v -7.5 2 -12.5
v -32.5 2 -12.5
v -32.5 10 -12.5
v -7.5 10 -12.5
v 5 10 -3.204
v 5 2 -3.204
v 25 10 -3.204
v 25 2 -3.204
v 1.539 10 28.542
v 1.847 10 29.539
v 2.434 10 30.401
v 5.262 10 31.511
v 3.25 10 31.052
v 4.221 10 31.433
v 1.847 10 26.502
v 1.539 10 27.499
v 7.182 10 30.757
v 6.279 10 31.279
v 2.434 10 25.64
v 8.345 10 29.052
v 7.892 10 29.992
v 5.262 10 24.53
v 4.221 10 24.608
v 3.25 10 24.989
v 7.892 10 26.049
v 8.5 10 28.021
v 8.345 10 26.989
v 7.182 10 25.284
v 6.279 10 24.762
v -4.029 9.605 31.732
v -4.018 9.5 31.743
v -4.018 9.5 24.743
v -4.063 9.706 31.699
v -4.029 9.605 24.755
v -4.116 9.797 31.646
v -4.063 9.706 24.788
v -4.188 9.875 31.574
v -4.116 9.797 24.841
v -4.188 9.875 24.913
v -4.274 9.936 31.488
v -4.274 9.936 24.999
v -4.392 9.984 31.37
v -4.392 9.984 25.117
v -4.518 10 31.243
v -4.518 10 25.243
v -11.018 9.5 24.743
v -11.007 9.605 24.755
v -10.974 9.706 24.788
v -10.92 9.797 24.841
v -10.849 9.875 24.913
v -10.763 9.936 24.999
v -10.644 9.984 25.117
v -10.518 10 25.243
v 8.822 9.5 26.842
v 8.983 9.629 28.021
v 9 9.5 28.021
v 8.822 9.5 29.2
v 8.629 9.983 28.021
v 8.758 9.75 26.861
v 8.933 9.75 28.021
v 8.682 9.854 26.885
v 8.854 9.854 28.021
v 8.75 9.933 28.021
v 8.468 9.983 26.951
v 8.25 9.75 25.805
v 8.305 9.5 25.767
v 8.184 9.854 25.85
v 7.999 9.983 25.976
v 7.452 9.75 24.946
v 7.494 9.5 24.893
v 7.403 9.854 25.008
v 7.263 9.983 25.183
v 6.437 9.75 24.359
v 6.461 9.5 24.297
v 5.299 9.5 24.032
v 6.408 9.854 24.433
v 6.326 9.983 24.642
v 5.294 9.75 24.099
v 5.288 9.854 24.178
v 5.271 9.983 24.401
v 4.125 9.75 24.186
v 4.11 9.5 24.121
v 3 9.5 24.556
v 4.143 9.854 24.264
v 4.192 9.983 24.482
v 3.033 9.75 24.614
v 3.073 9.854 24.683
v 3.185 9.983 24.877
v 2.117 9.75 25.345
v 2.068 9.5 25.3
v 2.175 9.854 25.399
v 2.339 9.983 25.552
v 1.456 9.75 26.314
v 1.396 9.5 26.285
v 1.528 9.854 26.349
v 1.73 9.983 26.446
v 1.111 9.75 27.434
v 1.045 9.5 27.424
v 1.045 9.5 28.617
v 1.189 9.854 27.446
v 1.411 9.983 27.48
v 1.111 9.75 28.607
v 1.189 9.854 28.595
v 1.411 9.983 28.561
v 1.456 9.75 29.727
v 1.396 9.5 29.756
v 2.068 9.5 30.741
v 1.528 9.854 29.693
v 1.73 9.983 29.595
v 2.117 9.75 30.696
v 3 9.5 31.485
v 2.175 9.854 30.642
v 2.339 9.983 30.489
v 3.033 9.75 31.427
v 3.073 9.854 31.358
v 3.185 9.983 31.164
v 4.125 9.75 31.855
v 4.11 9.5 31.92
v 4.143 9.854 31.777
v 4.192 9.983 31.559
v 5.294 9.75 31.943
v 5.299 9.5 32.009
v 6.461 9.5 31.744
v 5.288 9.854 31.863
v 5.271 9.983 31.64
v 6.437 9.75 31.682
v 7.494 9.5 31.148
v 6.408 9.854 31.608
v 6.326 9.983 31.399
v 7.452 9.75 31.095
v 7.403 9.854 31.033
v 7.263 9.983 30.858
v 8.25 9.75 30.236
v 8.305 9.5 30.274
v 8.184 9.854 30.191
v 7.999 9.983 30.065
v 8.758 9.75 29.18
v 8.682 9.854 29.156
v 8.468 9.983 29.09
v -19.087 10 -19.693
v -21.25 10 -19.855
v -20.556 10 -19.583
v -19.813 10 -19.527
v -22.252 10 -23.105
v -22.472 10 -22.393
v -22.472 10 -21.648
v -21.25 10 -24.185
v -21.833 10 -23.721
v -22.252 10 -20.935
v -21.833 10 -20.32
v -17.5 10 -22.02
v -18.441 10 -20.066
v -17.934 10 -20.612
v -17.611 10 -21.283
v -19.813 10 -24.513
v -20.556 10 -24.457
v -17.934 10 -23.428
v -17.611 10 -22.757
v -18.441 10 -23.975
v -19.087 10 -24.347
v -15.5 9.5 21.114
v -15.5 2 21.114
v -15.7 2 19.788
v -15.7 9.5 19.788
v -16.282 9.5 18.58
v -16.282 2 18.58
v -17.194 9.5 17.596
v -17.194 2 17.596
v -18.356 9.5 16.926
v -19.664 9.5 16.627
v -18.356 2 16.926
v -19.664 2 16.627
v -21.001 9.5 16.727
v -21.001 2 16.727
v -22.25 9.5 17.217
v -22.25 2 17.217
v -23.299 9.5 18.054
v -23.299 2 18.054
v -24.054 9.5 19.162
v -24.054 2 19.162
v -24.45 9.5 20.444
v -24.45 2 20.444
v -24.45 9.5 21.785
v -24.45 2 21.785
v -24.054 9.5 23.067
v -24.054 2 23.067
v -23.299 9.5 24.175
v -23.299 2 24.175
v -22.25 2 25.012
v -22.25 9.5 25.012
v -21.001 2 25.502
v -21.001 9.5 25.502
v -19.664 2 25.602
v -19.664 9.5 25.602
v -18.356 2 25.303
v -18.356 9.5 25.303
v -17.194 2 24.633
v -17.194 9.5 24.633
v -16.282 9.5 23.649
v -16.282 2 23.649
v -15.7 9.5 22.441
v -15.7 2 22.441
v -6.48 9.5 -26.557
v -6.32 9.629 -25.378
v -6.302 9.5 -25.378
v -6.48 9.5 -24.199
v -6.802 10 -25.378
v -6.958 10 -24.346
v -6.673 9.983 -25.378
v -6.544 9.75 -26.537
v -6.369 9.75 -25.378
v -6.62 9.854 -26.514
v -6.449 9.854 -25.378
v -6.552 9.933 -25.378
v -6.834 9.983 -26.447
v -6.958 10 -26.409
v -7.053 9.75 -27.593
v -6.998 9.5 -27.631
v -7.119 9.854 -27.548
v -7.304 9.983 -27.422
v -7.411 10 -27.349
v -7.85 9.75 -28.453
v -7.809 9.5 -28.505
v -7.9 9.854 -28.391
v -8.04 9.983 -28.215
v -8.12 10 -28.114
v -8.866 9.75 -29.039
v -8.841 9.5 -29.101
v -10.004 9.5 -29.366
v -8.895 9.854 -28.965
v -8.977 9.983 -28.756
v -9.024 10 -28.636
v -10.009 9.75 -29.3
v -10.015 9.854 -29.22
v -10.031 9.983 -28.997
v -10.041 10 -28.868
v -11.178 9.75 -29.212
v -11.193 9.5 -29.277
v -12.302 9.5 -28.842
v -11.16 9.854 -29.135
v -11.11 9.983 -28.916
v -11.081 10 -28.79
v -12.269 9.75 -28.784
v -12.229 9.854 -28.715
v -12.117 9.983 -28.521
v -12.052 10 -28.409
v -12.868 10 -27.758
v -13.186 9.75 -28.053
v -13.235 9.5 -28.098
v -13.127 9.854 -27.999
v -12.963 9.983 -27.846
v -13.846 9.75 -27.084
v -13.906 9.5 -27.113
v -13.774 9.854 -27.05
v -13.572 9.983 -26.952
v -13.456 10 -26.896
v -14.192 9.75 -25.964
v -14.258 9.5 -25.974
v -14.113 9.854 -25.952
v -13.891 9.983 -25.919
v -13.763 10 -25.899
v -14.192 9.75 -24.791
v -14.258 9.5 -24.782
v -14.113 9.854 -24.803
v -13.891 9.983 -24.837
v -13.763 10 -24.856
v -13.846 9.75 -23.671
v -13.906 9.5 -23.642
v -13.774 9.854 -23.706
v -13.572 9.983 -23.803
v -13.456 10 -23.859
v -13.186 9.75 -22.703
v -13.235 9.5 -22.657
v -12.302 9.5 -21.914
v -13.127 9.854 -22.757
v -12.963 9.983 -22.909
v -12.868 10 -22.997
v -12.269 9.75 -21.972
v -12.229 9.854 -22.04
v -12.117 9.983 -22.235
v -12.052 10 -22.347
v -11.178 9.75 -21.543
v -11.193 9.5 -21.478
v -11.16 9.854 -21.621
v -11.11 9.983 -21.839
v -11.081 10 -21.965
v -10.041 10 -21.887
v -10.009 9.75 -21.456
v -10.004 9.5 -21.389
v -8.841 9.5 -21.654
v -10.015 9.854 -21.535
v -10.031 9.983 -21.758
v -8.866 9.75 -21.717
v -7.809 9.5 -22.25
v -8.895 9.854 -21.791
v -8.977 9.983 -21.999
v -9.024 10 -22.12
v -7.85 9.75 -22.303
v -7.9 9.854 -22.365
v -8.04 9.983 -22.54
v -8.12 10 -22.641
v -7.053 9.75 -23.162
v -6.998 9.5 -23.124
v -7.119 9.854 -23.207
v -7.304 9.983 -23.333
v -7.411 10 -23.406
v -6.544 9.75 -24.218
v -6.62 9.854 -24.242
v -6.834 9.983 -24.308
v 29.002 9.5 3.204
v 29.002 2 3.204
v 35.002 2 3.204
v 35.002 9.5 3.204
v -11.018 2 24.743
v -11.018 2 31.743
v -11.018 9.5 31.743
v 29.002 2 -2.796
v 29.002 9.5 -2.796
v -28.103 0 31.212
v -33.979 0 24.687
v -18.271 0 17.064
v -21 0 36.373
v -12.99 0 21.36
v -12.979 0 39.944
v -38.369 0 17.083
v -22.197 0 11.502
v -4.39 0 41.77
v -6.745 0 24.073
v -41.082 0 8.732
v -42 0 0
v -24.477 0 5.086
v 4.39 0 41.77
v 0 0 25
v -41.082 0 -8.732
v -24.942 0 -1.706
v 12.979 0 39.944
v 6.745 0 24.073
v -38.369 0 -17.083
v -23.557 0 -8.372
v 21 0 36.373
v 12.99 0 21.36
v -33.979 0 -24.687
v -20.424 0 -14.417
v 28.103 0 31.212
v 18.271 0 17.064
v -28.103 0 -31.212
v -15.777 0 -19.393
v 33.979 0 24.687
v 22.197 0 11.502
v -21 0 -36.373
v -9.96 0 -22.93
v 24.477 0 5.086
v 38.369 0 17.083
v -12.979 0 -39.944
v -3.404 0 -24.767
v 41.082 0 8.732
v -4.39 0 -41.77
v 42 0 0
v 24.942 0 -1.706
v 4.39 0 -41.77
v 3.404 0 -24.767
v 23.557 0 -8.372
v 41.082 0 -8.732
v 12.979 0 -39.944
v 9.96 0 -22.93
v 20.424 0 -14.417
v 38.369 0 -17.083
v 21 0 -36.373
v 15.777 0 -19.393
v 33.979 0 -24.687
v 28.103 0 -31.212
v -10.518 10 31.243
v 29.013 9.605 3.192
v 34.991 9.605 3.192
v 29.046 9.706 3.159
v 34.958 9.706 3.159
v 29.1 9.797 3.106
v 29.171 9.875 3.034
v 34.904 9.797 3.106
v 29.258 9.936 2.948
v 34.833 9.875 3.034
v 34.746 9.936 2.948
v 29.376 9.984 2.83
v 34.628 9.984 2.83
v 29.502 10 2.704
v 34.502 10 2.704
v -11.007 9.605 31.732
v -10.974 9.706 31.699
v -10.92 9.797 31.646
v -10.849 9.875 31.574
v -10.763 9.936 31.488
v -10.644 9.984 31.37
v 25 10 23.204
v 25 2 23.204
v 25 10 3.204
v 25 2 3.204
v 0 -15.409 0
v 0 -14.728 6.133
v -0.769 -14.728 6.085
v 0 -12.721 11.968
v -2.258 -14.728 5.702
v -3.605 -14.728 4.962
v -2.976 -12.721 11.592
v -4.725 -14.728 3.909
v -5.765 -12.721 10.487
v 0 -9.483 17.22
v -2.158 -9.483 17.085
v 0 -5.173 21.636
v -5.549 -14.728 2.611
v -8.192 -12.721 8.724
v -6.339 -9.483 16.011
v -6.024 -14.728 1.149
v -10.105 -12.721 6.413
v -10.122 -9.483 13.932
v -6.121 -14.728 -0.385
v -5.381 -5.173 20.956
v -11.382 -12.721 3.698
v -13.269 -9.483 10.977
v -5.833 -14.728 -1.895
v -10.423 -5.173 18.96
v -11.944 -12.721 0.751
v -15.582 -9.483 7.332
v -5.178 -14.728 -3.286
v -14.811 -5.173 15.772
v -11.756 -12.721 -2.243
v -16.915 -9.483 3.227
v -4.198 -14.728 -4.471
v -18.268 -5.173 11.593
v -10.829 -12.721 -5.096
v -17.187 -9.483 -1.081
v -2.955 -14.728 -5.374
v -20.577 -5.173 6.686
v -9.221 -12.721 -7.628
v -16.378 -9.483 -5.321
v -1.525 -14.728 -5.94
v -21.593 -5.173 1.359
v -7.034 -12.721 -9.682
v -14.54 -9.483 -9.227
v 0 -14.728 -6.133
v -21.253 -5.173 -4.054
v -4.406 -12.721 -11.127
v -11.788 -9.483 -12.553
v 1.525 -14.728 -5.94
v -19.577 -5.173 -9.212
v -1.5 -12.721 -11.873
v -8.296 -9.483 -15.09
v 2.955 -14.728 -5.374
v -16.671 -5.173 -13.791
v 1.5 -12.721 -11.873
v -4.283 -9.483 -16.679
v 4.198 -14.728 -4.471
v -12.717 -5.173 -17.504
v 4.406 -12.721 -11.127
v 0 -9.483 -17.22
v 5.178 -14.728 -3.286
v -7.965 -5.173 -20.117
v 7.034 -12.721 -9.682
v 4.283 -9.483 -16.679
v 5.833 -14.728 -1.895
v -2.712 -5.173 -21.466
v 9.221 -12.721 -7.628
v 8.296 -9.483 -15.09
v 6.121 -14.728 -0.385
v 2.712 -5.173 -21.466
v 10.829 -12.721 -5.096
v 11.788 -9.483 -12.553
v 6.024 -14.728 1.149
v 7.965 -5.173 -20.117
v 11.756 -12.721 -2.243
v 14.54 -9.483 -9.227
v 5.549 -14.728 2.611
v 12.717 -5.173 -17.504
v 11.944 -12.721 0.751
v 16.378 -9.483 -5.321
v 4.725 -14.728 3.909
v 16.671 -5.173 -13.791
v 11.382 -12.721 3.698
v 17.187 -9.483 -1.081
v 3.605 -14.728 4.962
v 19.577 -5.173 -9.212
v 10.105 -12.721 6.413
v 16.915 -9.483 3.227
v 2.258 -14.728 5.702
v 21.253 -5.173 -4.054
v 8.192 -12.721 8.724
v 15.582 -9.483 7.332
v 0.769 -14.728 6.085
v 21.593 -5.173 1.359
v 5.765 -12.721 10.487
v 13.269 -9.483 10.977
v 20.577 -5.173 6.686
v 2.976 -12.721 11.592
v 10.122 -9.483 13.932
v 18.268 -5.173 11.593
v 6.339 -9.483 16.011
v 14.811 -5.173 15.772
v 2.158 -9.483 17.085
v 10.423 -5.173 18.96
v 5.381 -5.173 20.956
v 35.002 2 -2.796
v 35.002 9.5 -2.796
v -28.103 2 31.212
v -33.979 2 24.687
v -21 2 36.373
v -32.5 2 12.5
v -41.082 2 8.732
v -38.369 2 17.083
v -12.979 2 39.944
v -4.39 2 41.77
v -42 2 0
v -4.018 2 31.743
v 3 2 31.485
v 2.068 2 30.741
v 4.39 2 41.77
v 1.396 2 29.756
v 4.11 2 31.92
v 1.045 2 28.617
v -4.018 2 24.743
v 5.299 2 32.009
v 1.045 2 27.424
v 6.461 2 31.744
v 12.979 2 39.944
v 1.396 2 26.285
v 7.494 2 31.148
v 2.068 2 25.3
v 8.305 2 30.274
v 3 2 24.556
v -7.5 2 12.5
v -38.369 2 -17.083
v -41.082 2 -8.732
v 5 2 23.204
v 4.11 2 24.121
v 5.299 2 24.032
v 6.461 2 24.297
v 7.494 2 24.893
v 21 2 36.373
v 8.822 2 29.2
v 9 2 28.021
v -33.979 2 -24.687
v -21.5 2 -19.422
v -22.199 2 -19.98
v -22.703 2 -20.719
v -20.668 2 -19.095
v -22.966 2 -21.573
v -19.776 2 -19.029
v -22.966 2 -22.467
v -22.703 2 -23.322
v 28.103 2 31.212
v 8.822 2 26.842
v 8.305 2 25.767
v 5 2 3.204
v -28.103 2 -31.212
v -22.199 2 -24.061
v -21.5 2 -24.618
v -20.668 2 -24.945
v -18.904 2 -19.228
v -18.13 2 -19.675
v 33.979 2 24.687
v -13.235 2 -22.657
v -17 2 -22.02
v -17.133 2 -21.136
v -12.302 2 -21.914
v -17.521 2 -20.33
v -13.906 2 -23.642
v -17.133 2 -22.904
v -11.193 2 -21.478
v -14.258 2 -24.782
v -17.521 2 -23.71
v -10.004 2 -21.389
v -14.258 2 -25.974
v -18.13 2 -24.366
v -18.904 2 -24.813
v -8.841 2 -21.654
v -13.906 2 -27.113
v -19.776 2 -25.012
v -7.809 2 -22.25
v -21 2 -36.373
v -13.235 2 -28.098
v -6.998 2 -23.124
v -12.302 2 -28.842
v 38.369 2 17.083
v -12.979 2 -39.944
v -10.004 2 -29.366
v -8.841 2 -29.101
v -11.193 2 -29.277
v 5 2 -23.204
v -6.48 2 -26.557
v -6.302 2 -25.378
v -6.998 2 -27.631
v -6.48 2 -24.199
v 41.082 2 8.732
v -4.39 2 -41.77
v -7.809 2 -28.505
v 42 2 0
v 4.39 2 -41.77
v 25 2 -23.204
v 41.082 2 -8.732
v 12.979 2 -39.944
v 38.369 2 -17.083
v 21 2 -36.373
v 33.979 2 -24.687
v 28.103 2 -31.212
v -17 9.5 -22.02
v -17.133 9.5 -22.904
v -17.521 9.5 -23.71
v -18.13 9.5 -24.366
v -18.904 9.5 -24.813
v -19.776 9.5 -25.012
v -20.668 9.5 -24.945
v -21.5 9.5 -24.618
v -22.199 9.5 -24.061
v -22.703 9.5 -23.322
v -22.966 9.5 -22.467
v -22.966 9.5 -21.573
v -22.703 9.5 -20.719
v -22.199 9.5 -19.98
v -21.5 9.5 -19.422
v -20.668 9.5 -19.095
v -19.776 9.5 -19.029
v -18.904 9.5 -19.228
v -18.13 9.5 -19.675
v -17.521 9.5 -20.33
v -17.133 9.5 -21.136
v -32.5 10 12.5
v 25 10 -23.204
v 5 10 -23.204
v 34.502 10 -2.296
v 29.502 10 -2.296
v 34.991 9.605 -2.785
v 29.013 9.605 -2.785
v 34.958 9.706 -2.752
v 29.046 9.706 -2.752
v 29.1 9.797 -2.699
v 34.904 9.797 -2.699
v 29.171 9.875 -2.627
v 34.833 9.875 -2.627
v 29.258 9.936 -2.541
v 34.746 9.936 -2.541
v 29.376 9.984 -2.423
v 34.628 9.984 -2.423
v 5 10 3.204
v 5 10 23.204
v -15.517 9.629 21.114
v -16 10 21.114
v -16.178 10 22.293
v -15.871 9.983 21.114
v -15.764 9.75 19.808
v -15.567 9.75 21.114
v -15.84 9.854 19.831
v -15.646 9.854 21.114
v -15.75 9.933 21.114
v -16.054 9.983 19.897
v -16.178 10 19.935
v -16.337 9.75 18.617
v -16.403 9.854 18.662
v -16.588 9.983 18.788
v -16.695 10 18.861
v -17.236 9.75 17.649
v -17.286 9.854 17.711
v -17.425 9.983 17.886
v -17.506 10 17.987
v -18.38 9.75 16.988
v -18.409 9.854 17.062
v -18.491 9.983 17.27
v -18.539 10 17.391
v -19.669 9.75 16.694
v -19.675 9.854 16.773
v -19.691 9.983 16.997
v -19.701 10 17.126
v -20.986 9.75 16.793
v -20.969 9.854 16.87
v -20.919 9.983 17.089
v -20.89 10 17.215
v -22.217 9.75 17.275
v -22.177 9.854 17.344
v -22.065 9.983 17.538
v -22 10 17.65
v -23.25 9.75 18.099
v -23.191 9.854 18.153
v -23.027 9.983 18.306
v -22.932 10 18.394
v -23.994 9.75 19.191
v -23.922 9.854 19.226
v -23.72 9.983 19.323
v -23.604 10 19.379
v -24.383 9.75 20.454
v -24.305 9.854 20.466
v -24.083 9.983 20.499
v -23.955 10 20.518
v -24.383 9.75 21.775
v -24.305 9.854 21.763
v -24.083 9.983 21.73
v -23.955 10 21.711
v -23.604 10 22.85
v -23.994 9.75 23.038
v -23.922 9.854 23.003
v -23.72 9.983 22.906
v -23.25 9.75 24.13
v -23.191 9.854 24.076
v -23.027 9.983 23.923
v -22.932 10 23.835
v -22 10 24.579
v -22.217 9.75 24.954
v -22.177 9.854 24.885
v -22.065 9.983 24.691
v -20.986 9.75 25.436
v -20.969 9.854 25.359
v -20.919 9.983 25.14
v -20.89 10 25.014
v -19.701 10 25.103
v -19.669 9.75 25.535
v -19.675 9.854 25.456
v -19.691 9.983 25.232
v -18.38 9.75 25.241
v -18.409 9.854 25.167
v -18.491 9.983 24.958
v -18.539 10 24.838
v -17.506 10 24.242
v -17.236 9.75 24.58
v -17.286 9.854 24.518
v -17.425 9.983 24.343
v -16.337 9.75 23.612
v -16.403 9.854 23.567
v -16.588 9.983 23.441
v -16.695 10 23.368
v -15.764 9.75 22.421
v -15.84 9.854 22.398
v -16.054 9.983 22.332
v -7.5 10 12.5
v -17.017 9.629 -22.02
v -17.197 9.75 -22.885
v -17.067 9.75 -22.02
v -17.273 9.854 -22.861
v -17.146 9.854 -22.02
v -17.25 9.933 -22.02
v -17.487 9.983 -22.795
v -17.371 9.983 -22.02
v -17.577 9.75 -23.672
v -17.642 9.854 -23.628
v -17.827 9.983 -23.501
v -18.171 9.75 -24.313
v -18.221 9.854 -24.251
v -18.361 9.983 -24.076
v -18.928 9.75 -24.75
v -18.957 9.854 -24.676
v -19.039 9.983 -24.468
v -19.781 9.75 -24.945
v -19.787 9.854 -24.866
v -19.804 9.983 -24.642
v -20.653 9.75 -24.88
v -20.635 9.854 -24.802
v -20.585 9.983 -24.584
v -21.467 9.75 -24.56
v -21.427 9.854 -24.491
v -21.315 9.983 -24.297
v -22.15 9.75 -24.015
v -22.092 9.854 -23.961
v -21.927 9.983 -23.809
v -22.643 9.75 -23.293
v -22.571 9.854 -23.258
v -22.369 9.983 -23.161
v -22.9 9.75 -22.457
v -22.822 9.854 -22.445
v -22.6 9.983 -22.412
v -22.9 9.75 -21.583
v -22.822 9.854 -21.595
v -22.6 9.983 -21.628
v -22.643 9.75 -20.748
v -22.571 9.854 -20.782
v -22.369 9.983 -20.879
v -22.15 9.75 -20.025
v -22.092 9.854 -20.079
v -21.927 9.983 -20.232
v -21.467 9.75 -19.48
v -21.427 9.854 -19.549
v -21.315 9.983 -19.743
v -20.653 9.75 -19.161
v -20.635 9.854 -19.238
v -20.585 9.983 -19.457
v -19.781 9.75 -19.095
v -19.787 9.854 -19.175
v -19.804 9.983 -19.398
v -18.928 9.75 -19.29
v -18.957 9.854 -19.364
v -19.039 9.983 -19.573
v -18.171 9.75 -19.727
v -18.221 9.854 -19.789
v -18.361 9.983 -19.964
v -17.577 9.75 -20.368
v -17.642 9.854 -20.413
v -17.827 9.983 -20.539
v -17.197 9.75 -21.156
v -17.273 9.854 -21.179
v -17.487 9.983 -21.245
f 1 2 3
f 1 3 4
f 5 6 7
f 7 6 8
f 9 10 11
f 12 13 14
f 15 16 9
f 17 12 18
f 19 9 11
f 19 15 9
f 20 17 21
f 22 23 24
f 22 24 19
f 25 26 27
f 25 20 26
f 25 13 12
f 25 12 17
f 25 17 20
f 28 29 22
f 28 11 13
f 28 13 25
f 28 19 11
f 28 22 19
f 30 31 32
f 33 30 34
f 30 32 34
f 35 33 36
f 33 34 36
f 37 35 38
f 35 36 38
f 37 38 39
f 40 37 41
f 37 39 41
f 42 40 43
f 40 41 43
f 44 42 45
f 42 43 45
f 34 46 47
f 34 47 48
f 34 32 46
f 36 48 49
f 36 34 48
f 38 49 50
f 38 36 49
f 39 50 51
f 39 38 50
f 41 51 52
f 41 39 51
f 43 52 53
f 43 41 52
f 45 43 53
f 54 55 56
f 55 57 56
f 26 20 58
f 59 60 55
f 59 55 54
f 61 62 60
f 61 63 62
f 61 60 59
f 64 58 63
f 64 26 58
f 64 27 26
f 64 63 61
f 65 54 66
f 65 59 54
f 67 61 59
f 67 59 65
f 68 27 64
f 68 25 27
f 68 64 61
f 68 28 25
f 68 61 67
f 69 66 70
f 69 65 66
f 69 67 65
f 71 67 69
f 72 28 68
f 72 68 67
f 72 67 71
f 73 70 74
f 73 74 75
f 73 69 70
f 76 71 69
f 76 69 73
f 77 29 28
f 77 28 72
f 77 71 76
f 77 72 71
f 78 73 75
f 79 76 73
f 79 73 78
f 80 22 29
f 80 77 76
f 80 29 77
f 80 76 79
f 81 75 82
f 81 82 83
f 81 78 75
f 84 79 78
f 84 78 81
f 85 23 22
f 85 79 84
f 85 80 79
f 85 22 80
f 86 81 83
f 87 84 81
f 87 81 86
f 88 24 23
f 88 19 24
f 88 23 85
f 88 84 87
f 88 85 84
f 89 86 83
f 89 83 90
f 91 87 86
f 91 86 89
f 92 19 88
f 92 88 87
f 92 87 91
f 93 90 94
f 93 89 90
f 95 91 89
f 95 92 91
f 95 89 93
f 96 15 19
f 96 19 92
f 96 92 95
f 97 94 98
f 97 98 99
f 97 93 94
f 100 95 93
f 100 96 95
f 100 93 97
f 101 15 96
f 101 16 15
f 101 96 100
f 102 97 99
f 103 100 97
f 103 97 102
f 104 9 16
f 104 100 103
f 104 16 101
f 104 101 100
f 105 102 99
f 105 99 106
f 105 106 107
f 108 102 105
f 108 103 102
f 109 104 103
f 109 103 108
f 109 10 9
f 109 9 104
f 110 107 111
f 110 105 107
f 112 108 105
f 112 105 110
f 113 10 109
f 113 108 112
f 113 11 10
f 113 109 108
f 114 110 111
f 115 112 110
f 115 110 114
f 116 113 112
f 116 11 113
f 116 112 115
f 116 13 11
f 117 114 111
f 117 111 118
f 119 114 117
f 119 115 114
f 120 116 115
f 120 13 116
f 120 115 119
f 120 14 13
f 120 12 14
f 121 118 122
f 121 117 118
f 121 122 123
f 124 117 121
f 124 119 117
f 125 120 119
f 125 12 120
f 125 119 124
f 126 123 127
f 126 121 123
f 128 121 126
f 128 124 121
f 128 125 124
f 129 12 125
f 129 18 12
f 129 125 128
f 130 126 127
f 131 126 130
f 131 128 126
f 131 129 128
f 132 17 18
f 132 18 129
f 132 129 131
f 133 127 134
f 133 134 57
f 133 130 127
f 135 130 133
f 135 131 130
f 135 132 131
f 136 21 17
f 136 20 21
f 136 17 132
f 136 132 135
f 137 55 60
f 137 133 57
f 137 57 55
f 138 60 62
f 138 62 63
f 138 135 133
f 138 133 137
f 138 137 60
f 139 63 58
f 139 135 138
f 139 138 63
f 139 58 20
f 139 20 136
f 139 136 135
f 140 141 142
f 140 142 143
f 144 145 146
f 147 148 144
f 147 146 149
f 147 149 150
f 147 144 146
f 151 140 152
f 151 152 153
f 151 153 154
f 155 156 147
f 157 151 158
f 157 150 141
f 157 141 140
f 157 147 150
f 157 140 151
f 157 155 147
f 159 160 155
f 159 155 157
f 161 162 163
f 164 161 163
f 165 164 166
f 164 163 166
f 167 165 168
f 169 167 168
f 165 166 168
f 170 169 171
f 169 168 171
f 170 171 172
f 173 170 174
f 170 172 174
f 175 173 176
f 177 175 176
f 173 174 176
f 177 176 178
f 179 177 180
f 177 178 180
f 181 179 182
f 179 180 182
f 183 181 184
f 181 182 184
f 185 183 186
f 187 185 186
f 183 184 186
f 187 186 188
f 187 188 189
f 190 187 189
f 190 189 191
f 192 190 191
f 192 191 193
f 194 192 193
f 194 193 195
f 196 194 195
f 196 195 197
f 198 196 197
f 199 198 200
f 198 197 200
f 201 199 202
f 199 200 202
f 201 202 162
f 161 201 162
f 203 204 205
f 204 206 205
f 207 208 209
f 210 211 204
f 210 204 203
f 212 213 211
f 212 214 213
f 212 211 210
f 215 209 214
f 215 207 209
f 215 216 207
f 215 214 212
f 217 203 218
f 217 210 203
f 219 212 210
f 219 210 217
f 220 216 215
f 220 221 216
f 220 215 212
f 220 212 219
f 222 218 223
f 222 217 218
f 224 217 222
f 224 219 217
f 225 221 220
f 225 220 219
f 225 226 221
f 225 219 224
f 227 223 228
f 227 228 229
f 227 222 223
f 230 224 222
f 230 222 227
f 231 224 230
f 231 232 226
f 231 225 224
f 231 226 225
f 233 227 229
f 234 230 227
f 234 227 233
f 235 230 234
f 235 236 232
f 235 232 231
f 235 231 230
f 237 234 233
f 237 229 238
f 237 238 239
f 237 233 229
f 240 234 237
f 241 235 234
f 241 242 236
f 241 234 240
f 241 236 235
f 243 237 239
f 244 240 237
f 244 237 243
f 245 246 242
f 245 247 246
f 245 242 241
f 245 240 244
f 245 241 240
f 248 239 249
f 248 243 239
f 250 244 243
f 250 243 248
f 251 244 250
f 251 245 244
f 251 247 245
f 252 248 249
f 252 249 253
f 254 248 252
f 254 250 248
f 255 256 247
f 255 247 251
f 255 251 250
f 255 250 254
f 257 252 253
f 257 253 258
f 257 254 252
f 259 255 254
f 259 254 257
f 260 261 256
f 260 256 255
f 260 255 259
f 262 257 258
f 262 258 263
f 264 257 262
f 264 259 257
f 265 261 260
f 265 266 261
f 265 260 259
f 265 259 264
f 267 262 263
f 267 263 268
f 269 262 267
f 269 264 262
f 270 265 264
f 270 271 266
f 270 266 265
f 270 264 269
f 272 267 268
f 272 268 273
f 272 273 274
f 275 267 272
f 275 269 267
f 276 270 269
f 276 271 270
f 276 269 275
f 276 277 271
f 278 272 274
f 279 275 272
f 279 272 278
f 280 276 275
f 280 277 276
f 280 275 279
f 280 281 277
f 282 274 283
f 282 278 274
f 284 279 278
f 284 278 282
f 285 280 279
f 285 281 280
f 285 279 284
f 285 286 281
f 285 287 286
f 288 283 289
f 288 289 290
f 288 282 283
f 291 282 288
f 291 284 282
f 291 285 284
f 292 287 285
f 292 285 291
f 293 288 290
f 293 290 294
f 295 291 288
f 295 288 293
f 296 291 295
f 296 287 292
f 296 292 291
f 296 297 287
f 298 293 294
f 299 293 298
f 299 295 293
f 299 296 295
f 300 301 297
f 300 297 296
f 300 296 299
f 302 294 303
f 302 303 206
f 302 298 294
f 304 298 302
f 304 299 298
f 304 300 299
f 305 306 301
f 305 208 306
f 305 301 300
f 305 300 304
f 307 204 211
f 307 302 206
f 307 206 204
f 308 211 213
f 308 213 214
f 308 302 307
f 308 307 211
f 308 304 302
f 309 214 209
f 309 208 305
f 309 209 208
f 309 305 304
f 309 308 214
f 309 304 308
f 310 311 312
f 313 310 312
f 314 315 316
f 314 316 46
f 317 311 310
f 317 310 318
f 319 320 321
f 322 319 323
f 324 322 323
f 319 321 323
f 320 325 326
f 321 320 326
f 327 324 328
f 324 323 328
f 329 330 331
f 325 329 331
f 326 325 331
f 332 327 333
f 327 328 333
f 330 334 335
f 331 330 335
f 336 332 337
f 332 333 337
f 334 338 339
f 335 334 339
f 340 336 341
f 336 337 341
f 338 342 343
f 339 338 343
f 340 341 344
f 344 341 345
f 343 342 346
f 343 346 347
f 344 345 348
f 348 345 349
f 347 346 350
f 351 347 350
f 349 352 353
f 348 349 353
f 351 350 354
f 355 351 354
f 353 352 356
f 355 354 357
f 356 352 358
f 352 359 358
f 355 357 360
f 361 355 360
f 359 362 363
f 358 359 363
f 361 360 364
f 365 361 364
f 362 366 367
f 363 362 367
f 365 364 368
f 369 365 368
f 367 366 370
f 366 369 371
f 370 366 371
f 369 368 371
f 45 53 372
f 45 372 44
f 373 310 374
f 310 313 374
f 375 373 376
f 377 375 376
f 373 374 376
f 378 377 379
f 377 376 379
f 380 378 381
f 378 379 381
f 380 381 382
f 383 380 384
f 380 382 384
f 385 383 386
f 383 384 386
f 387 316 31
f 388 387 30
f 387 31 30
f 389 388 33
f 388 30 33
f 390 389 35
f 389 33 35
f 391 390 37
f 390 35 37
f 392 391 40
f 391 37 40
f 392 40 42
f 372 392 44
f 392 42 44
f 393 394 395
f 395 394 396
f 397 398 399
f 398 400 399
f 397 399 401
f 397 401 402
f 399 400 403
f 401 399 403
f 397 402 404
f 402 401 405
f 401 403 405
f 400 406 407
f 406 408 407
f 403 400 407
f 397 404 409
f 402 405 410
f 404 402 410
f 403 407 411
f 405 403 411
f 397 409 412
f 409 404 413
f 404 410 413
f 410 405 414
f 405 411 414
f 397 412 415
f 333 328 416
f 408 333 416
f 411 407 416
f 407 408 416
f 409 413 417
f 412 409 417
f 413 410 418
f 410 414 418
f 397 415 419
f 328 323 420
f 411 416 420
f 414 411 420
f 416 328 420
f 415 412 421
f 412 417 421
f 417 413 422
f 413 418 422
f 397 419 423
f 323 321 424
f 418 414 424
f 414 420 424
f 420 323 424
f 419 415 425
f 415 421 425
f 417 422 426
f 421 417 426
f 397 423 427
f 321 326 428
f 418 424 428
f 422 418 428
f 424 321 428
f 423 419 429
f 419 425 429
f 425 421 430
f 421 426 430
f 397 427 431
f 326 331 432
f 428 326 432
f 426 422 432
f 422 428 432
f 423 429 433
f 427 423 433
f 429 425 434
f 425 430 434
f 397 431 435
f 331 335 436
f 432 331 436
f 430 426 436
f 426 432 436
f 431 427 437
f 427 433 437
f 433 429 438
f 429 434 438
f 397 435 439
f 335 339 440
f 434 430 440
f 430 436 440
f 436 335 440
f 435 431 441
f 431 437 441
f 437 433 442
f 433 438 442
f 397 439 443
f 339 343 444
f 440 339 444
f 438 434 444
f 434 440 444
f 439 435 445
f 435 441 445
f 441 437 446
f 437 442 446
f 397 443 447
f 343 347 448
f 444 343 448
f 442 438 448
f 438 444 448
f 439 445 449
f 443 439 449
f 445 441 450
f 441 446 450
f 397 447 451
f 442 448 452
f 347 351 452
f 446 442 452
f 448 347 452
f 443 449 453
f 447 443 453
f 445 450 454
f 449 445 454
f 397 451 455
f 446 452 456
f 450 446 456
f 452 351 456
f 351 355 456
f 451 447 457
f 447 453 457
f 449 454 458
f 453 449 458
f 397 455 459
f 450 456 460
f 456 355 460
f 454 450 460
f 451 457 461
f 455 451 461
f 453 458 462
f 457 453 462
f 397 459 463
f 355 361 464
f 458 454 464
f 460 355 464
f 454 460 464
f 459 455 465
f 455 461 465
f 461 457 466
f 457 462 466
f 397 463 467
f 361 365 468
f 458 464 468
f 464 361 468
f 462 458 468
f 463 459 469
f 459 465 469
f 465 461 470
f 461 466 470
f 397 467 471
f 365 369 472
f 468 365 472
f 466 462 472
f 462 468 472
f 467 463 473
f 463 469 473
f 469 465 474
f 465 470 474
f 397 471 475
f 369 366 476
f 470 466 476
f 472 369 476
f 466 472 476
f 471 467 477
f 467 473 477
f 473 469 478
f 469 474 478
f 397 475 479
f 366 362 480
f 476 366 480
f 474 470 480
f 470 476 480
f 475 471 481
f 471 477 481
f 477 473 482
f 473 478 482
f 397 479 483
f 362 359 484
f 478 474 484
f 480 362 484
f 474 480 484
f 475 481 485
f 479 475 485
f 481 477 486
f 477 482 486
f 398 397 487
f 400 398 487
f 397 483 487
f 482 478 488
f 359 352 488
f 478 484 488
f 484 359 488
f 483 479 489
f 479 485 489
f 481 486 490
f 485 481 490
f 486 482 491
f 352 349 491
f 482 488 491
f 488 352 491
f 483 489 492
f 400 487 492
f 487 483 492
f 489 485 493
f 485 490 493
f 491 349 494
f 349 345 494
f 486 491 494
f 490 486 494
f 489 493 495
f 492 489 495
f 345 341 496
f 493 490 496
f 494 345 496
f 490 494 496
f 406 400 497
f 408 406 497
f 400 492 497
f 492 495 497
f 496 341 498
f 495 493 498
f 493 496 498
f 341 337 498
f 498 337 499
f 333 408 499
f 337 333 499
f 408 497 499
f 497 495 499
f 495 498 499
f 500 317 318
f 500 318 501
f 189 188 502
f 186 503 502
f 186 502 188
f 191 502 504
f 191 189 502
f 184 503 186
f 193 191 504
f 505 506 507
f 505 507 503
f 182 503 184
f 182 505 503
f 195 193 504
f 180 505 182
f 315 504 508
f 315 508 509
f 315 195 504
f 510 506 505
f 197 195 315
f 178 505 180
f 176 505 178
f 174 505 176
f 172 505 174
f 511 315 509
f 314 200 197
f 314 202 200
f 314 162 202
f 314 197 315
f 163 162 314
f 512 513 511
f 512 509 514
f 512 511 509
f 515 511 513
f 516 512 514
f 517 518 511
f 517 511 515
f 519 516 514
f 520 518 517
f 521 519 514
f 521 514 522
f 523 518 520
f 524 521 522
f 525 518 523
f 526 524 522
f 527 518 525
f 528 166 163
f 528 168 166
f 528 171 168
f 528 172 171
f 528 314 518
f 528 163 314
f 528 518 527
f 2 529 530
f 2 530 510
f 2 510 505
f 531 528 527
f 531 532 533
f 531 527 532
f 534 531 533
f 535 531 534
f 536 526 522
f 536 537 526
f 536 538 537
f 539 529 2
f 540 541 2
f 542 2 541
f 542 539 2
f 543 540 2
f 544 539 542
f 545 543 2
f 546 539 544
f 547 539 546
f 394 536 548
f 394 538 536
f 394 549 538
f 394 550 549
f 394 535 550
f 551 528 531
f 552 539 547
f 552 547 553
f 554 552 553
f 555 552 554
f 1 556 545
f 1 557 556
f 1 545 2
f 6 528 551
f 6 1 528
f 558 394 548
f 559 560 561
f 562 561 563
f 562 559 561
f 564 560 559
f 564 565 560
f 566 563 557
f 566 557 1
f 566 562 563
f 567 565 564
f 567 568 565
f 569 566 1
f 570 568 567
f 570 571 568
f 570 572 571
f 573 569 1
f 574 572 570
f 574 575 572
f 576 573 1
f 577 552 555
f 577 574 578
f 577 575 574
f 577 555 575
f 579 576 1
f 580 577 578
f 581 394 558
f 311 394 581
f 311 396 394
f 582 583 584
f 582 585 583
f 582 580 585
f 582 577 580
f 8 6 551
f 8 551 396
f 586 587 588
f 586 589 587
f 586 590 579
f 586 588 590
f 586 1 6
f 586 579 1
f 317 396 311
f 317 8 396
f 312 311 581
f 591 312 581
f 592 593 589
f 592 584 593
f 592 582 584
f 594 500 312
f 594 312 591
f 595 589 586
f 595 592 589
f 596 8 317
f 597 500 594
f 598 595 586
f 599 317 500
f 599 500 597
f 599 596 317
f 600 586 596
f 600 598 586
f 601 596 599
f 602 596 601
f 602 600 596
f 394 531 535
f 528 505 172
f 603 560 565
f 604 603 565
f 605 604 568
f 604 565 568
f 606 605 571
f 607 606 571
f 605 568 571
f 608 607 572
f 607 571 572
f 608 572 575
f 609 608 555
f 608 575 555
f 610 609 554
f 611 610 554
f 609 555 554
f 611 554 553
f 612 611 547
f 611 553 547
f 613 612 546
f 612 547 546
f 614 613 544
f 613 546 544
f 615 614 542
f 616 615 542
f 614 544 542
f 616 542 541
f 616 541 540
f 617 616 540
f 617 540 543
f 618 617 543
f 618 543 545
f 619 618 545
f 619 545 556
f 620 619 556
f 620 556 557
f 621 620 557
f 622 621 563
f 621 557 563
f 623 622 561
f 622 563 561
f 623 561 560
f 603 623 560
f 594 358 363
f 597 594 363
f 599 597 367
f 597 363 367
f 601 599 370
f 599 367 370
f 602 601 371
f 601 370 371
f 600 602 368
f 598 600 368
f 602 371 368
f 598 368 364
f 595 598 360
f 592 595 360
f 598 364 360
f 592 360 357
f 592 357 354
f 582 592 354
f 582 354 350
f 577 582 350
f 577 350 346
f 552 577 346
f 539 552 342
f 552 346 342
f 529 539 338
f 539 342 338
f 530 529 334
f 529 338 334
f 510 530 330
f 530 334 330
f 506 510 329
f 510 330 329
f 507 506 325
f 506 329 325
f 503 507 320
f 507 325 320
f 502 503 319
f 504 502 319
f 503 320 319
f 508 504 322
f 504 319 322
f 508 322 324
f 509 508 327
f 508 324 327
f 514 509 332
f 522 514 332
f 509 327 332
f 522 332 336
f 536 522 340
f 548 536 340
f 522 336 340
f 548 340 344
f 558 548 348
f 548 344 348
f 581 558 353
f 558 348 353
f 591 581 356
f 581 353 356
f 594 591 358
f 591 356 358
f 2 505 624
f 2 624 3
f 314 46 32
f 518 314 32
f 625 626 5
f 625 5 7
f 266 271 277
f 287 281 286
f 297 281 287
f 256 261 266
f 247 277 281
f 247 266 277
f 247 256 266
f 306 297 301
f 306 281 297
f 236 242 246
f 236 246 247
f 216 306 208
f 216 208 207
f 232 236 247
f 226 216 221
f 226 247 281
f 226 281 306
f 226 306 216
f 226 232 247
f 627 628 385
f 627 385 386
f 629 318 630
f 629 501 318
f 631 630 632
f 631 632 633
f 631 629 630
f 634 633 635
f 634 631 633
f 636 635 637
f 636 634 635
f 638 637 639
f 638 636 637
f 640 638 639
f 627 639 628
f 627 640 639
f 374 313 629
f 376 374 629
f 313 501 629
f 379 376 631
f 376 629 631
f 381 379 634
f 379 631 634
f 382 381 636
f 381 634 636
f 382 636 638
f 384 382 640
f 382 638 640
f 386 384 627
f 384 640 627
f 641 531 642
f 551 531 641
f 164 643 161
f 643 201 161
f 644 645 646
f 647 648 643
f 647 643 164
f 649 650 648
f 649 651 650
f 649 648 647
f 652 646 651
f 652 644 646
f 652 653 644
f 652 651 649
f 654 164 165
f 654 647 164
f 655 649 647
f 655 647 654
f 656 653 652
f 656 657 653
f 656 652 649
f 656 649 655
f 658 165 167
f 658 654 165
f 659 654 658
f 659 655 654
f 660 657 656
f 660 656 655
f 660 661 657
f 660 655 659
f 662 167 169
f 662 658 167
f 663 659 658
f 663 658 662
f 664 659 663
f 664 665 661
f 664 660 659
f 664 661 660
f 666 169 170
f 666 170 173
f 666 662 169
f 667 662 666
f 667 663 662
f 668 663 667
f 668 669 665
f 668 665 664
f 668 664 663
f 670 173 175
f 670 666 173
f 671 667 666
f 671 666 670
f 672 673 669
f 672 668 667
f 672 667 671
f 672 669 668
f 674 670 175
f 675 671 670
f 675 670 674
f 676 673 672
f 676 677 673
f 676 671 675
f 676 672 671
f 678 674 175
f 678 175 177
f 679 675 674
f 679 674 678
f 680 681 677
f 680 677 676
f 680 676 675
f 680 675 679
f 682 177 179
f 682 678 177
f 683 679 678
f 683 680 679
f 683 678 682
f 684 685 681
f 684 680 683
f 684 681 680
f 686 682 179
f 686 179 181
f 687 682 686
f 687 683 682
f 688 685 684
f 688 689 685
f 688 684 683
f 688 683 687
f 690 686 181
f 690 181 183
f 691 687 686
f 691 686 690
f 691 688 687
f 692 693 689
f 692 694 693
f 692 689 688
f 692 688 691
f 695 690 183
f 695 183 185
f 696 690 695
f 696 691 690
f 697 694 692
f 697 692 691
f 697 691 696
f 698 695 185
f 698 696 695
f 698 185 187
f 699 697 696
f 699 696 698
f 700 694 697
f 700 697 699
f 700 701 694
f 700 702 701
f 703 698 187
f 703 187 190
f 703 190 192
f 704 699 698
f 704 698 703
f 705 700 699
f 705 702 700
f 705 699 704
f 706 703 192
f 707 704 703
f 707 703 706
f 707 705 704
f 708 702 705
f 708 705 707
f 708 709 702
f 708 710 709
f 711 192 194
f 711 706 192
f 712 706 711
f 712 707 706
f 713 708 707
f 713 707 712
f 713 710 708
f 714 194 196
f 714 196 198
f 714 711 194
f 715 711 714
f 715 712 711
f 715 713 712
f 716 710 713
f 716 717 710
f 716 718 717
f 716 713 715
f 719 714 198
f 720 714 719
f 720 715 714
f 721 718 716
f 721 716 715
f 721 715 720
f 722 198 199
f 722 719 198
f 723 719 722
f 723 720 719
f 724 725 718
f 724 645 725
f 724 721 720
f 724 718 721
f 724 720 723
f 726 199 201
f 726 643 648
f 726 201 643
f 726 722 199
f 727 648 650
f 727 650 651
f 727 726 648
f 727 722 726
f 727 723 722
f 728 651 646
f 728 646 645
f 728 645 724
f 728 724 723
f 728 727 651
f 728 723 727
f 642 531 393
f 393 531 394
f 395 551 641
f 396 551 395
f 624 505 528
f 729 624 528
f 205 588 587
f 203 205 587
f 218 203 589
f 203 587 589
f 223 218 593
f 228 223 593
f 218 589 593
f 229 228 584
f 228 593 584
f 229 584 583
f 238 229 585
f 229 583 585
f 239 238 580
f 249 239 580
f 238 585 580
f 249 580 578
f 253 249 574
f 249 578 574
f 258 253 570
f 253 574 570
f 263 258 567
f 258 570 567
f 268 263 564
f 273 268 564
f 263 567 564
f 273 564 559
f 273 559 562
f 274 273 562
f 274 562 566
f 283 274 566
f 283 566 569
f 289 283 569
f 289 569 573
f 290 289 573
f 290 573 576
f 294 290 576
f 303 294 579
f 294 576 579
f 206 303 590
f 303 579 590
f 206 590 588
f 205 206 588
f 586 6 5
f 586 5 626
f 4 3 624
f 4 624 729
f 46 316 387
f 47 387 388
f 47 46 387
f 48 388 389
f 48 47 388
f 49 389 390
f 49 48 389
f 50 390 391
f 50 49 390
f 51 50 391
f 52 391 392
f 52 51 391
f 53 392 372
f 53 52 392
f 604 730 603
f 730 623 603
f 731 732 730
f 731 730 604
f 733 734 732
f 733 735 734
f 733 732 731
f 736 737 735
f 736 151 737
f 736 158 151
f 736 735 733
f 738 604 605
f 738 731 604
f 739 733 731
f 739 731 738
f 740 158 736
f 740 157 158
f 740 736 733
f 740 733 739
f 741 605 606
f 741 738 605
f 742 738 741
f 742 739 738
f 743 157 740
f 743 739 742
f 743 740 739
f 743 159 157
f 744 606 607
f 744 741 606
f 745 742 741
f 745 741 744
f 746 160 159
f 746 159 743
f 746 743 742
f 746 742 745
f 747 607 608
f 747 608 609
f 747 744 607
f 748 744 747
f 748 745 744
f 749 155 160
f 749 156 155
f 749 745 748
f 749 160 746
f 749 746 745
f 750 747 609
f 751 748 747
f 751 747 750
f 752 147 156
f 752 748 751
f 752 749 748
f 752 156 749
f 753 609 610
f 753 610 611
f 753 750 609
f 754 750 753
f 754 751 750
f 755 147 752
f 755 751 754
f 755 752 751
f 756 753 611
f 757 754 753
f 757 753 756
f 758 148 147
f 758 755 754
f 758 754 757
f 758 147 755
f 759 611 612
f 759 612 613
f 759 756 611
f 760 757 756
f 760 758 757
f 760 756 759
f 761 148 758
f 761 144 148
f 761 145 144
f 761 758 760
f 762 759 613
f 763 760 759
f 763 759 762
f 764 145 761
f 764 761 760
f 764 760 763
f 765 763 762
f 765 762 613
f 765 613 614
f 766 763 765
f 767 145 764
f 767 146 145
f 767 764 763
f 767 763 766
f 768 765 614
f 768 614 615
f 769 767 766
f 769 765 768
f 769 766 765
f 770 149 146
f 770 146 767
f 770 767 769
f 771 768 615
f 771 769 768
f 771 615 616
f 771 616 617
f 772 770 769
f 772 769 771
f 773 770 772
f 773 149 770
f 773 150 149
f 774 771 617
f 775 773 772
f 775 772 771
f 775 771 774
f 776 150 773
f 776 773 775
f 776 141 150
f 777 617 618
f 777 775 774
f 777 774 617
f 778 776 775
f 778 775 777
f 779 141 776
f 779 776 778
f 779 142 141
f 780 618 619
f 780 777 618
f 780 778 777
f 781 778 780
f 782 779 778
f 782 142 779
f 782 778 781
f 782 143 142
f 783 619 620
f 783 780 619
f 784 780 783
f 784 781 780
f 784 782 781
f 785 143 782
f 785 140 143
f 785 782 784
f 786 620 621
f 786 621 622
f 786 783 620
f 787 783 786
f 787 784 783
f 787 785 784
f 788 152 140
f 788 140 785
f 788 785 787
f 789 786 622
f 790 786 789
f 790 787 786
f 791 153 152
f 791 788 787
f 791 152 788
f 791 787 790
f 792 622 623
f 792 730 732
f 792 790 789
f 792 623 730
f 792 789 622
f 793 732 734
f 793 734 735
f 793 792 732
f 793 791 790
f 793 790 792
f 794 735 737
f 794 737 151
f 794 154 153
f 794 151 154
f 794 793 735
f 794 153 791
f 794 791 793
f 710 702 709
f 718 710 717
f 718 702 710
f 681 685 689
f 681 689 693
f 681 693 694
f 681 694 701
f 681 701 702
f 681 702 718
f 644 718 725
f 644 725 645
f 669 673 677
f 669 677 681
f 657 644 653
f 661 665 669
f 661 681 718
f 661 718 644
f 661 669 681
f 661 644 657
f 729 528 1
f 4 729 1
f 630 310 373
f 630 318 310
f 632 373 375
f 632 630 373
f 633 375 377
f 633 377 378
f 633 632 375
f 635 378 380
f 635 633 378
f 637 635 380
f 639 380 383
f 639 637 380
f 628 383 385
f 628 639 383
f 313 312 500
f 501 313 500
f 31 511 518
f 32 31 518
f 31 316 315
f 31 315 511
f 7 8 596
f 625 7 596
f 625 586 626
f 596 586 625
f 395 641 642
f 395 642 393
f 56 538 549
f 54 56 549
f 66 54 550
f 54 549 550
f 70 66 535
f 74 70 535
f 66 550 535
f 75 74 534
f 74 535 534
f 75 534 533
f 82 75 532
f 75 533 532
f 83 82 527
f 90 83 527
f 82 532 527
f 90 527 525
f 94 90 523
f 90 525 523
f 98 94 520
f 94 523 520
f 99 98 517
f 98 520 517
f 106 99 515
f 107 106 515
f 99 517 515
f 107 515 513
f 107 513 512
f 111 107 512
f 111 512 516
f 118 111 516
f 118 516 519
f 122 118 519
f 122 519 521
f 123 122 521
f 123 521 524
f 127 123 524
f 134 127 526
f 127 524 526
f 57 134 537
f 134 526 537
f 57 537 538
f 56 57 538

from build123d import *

# Parameters (mm, degrees)
SKETCH1_R           = 42
BOSS_EXTRUDE1_DEPTH = 2
SKETCH2_R           = 3
SKETCH2_R_2         = 4
SKETCH2_R_3         = 4.5
SKETCH2_W           = 25
SKETCH2_H           = 25
SKETCH2_W_2         = 20
SKETCH2_H_2         = 20
SKETCH2_W_3         = 7
SKETCH2_H_3         = 7
SKETCH2_W_4         = 6
SKETCH2_H_4         = 6
BOSS_EXTRUDE2_DEPTH = 8
FILLET1_R           = 0.5


with BuildPart() as part:
    # Sketch1 → Boss-Extrude1 (new body)
    with BuildSketch(Plane(origin=(0, 0, 0), x_dir=(1, 0, 0), z_dir=(0, 1, 0))):
        Circle(SKETCH1_R)
    extrude(amount=BOSS_EXTRUDE1_DEPTH)

    # Sketch2 → Boss-Extrude2 (add)
    with BuildSketch(Plane(origin=(0, 2, 0), x_dir=(1, 0, 0), z_dir=(0, 1, 0))):
        with Locations((-20, 22.020171122)):
            Circle(SKETCH2_R)
        with Locations((-10.302496515, 25.377676752)):
            Circle(SKETCH2_R_2)
        with Locations((-20, -21.114457143)):
            Circle(SKETCH2_R_3)
        with Locations((5, -28.020526235)):
            Circle(SKETCH2_R_2)
        with Locations((-20, 0)):
            Rectangle(SKETCH2_W, SKETCH2_H)
        with Locations((15, 13.203564029)):
            Rectangle(SKETCH2_W_2, SKETCH2_H_2)
        with Locations((15, -13.203564029)):
            Rectangle(SKETCH2_W_2, SKETCH2_H_2)
        with Locations((-7.518218001, -28.243397592)):
            Rectangle(SKETCH2_W_3, SKETCH2_H_3)
        with Locations((32.002130678, -0.203564029)):
            Rectangle(SKETCH2_W_4, SKETCH2_H_4)
    extrude(amount=BOSS_EXTRUDE2_DEPTH)

    # Fillet1
    fillet1_edges = [part.edges().sort_by_distance(p)[0] for p in [
        (-23, 10, -22.020171122),
        (-14.302496515, 10, -25.377676752),
        (-24.5, 10, 21.114457143),
        (1, 10, 28.020526235),
        (-11.018218001, 10, 28.243397592),
        (-7.518218001, 10, 31.743397592),
        (-4.018218001, 10, 28.243397592),
        (-7.518218001, 10, 24.743397592),
        (35.002130678, 10, 0.203564029),
        (32.002130678, 10, -2.796435971),
        (29.002130678, 10, 0.203564029),
        (32.002130678, 10, 3.203564029),
    ]]
    fillet(fillet1_edges, radius=FILLET1_R)

    # Sketch6 → Revolve1 (revolve)
    with BuildSketch(Plane(origin=(0, 0, 0), x_dir=(0, 0, -1), z_dir=(1, 0, 0))):
        with BuildLine():
            Line((0, 0), (0, -15.408613296))
            ThreePointArc((0, -15.408613296), (-14.683539795, -11.247032644), (-25, 0))
            Line((-25, 0), (0, 0))
        make_face()
    revolve(axis=Axis((0, 0, 0), (0, -1, 0)))


solid = part.part
